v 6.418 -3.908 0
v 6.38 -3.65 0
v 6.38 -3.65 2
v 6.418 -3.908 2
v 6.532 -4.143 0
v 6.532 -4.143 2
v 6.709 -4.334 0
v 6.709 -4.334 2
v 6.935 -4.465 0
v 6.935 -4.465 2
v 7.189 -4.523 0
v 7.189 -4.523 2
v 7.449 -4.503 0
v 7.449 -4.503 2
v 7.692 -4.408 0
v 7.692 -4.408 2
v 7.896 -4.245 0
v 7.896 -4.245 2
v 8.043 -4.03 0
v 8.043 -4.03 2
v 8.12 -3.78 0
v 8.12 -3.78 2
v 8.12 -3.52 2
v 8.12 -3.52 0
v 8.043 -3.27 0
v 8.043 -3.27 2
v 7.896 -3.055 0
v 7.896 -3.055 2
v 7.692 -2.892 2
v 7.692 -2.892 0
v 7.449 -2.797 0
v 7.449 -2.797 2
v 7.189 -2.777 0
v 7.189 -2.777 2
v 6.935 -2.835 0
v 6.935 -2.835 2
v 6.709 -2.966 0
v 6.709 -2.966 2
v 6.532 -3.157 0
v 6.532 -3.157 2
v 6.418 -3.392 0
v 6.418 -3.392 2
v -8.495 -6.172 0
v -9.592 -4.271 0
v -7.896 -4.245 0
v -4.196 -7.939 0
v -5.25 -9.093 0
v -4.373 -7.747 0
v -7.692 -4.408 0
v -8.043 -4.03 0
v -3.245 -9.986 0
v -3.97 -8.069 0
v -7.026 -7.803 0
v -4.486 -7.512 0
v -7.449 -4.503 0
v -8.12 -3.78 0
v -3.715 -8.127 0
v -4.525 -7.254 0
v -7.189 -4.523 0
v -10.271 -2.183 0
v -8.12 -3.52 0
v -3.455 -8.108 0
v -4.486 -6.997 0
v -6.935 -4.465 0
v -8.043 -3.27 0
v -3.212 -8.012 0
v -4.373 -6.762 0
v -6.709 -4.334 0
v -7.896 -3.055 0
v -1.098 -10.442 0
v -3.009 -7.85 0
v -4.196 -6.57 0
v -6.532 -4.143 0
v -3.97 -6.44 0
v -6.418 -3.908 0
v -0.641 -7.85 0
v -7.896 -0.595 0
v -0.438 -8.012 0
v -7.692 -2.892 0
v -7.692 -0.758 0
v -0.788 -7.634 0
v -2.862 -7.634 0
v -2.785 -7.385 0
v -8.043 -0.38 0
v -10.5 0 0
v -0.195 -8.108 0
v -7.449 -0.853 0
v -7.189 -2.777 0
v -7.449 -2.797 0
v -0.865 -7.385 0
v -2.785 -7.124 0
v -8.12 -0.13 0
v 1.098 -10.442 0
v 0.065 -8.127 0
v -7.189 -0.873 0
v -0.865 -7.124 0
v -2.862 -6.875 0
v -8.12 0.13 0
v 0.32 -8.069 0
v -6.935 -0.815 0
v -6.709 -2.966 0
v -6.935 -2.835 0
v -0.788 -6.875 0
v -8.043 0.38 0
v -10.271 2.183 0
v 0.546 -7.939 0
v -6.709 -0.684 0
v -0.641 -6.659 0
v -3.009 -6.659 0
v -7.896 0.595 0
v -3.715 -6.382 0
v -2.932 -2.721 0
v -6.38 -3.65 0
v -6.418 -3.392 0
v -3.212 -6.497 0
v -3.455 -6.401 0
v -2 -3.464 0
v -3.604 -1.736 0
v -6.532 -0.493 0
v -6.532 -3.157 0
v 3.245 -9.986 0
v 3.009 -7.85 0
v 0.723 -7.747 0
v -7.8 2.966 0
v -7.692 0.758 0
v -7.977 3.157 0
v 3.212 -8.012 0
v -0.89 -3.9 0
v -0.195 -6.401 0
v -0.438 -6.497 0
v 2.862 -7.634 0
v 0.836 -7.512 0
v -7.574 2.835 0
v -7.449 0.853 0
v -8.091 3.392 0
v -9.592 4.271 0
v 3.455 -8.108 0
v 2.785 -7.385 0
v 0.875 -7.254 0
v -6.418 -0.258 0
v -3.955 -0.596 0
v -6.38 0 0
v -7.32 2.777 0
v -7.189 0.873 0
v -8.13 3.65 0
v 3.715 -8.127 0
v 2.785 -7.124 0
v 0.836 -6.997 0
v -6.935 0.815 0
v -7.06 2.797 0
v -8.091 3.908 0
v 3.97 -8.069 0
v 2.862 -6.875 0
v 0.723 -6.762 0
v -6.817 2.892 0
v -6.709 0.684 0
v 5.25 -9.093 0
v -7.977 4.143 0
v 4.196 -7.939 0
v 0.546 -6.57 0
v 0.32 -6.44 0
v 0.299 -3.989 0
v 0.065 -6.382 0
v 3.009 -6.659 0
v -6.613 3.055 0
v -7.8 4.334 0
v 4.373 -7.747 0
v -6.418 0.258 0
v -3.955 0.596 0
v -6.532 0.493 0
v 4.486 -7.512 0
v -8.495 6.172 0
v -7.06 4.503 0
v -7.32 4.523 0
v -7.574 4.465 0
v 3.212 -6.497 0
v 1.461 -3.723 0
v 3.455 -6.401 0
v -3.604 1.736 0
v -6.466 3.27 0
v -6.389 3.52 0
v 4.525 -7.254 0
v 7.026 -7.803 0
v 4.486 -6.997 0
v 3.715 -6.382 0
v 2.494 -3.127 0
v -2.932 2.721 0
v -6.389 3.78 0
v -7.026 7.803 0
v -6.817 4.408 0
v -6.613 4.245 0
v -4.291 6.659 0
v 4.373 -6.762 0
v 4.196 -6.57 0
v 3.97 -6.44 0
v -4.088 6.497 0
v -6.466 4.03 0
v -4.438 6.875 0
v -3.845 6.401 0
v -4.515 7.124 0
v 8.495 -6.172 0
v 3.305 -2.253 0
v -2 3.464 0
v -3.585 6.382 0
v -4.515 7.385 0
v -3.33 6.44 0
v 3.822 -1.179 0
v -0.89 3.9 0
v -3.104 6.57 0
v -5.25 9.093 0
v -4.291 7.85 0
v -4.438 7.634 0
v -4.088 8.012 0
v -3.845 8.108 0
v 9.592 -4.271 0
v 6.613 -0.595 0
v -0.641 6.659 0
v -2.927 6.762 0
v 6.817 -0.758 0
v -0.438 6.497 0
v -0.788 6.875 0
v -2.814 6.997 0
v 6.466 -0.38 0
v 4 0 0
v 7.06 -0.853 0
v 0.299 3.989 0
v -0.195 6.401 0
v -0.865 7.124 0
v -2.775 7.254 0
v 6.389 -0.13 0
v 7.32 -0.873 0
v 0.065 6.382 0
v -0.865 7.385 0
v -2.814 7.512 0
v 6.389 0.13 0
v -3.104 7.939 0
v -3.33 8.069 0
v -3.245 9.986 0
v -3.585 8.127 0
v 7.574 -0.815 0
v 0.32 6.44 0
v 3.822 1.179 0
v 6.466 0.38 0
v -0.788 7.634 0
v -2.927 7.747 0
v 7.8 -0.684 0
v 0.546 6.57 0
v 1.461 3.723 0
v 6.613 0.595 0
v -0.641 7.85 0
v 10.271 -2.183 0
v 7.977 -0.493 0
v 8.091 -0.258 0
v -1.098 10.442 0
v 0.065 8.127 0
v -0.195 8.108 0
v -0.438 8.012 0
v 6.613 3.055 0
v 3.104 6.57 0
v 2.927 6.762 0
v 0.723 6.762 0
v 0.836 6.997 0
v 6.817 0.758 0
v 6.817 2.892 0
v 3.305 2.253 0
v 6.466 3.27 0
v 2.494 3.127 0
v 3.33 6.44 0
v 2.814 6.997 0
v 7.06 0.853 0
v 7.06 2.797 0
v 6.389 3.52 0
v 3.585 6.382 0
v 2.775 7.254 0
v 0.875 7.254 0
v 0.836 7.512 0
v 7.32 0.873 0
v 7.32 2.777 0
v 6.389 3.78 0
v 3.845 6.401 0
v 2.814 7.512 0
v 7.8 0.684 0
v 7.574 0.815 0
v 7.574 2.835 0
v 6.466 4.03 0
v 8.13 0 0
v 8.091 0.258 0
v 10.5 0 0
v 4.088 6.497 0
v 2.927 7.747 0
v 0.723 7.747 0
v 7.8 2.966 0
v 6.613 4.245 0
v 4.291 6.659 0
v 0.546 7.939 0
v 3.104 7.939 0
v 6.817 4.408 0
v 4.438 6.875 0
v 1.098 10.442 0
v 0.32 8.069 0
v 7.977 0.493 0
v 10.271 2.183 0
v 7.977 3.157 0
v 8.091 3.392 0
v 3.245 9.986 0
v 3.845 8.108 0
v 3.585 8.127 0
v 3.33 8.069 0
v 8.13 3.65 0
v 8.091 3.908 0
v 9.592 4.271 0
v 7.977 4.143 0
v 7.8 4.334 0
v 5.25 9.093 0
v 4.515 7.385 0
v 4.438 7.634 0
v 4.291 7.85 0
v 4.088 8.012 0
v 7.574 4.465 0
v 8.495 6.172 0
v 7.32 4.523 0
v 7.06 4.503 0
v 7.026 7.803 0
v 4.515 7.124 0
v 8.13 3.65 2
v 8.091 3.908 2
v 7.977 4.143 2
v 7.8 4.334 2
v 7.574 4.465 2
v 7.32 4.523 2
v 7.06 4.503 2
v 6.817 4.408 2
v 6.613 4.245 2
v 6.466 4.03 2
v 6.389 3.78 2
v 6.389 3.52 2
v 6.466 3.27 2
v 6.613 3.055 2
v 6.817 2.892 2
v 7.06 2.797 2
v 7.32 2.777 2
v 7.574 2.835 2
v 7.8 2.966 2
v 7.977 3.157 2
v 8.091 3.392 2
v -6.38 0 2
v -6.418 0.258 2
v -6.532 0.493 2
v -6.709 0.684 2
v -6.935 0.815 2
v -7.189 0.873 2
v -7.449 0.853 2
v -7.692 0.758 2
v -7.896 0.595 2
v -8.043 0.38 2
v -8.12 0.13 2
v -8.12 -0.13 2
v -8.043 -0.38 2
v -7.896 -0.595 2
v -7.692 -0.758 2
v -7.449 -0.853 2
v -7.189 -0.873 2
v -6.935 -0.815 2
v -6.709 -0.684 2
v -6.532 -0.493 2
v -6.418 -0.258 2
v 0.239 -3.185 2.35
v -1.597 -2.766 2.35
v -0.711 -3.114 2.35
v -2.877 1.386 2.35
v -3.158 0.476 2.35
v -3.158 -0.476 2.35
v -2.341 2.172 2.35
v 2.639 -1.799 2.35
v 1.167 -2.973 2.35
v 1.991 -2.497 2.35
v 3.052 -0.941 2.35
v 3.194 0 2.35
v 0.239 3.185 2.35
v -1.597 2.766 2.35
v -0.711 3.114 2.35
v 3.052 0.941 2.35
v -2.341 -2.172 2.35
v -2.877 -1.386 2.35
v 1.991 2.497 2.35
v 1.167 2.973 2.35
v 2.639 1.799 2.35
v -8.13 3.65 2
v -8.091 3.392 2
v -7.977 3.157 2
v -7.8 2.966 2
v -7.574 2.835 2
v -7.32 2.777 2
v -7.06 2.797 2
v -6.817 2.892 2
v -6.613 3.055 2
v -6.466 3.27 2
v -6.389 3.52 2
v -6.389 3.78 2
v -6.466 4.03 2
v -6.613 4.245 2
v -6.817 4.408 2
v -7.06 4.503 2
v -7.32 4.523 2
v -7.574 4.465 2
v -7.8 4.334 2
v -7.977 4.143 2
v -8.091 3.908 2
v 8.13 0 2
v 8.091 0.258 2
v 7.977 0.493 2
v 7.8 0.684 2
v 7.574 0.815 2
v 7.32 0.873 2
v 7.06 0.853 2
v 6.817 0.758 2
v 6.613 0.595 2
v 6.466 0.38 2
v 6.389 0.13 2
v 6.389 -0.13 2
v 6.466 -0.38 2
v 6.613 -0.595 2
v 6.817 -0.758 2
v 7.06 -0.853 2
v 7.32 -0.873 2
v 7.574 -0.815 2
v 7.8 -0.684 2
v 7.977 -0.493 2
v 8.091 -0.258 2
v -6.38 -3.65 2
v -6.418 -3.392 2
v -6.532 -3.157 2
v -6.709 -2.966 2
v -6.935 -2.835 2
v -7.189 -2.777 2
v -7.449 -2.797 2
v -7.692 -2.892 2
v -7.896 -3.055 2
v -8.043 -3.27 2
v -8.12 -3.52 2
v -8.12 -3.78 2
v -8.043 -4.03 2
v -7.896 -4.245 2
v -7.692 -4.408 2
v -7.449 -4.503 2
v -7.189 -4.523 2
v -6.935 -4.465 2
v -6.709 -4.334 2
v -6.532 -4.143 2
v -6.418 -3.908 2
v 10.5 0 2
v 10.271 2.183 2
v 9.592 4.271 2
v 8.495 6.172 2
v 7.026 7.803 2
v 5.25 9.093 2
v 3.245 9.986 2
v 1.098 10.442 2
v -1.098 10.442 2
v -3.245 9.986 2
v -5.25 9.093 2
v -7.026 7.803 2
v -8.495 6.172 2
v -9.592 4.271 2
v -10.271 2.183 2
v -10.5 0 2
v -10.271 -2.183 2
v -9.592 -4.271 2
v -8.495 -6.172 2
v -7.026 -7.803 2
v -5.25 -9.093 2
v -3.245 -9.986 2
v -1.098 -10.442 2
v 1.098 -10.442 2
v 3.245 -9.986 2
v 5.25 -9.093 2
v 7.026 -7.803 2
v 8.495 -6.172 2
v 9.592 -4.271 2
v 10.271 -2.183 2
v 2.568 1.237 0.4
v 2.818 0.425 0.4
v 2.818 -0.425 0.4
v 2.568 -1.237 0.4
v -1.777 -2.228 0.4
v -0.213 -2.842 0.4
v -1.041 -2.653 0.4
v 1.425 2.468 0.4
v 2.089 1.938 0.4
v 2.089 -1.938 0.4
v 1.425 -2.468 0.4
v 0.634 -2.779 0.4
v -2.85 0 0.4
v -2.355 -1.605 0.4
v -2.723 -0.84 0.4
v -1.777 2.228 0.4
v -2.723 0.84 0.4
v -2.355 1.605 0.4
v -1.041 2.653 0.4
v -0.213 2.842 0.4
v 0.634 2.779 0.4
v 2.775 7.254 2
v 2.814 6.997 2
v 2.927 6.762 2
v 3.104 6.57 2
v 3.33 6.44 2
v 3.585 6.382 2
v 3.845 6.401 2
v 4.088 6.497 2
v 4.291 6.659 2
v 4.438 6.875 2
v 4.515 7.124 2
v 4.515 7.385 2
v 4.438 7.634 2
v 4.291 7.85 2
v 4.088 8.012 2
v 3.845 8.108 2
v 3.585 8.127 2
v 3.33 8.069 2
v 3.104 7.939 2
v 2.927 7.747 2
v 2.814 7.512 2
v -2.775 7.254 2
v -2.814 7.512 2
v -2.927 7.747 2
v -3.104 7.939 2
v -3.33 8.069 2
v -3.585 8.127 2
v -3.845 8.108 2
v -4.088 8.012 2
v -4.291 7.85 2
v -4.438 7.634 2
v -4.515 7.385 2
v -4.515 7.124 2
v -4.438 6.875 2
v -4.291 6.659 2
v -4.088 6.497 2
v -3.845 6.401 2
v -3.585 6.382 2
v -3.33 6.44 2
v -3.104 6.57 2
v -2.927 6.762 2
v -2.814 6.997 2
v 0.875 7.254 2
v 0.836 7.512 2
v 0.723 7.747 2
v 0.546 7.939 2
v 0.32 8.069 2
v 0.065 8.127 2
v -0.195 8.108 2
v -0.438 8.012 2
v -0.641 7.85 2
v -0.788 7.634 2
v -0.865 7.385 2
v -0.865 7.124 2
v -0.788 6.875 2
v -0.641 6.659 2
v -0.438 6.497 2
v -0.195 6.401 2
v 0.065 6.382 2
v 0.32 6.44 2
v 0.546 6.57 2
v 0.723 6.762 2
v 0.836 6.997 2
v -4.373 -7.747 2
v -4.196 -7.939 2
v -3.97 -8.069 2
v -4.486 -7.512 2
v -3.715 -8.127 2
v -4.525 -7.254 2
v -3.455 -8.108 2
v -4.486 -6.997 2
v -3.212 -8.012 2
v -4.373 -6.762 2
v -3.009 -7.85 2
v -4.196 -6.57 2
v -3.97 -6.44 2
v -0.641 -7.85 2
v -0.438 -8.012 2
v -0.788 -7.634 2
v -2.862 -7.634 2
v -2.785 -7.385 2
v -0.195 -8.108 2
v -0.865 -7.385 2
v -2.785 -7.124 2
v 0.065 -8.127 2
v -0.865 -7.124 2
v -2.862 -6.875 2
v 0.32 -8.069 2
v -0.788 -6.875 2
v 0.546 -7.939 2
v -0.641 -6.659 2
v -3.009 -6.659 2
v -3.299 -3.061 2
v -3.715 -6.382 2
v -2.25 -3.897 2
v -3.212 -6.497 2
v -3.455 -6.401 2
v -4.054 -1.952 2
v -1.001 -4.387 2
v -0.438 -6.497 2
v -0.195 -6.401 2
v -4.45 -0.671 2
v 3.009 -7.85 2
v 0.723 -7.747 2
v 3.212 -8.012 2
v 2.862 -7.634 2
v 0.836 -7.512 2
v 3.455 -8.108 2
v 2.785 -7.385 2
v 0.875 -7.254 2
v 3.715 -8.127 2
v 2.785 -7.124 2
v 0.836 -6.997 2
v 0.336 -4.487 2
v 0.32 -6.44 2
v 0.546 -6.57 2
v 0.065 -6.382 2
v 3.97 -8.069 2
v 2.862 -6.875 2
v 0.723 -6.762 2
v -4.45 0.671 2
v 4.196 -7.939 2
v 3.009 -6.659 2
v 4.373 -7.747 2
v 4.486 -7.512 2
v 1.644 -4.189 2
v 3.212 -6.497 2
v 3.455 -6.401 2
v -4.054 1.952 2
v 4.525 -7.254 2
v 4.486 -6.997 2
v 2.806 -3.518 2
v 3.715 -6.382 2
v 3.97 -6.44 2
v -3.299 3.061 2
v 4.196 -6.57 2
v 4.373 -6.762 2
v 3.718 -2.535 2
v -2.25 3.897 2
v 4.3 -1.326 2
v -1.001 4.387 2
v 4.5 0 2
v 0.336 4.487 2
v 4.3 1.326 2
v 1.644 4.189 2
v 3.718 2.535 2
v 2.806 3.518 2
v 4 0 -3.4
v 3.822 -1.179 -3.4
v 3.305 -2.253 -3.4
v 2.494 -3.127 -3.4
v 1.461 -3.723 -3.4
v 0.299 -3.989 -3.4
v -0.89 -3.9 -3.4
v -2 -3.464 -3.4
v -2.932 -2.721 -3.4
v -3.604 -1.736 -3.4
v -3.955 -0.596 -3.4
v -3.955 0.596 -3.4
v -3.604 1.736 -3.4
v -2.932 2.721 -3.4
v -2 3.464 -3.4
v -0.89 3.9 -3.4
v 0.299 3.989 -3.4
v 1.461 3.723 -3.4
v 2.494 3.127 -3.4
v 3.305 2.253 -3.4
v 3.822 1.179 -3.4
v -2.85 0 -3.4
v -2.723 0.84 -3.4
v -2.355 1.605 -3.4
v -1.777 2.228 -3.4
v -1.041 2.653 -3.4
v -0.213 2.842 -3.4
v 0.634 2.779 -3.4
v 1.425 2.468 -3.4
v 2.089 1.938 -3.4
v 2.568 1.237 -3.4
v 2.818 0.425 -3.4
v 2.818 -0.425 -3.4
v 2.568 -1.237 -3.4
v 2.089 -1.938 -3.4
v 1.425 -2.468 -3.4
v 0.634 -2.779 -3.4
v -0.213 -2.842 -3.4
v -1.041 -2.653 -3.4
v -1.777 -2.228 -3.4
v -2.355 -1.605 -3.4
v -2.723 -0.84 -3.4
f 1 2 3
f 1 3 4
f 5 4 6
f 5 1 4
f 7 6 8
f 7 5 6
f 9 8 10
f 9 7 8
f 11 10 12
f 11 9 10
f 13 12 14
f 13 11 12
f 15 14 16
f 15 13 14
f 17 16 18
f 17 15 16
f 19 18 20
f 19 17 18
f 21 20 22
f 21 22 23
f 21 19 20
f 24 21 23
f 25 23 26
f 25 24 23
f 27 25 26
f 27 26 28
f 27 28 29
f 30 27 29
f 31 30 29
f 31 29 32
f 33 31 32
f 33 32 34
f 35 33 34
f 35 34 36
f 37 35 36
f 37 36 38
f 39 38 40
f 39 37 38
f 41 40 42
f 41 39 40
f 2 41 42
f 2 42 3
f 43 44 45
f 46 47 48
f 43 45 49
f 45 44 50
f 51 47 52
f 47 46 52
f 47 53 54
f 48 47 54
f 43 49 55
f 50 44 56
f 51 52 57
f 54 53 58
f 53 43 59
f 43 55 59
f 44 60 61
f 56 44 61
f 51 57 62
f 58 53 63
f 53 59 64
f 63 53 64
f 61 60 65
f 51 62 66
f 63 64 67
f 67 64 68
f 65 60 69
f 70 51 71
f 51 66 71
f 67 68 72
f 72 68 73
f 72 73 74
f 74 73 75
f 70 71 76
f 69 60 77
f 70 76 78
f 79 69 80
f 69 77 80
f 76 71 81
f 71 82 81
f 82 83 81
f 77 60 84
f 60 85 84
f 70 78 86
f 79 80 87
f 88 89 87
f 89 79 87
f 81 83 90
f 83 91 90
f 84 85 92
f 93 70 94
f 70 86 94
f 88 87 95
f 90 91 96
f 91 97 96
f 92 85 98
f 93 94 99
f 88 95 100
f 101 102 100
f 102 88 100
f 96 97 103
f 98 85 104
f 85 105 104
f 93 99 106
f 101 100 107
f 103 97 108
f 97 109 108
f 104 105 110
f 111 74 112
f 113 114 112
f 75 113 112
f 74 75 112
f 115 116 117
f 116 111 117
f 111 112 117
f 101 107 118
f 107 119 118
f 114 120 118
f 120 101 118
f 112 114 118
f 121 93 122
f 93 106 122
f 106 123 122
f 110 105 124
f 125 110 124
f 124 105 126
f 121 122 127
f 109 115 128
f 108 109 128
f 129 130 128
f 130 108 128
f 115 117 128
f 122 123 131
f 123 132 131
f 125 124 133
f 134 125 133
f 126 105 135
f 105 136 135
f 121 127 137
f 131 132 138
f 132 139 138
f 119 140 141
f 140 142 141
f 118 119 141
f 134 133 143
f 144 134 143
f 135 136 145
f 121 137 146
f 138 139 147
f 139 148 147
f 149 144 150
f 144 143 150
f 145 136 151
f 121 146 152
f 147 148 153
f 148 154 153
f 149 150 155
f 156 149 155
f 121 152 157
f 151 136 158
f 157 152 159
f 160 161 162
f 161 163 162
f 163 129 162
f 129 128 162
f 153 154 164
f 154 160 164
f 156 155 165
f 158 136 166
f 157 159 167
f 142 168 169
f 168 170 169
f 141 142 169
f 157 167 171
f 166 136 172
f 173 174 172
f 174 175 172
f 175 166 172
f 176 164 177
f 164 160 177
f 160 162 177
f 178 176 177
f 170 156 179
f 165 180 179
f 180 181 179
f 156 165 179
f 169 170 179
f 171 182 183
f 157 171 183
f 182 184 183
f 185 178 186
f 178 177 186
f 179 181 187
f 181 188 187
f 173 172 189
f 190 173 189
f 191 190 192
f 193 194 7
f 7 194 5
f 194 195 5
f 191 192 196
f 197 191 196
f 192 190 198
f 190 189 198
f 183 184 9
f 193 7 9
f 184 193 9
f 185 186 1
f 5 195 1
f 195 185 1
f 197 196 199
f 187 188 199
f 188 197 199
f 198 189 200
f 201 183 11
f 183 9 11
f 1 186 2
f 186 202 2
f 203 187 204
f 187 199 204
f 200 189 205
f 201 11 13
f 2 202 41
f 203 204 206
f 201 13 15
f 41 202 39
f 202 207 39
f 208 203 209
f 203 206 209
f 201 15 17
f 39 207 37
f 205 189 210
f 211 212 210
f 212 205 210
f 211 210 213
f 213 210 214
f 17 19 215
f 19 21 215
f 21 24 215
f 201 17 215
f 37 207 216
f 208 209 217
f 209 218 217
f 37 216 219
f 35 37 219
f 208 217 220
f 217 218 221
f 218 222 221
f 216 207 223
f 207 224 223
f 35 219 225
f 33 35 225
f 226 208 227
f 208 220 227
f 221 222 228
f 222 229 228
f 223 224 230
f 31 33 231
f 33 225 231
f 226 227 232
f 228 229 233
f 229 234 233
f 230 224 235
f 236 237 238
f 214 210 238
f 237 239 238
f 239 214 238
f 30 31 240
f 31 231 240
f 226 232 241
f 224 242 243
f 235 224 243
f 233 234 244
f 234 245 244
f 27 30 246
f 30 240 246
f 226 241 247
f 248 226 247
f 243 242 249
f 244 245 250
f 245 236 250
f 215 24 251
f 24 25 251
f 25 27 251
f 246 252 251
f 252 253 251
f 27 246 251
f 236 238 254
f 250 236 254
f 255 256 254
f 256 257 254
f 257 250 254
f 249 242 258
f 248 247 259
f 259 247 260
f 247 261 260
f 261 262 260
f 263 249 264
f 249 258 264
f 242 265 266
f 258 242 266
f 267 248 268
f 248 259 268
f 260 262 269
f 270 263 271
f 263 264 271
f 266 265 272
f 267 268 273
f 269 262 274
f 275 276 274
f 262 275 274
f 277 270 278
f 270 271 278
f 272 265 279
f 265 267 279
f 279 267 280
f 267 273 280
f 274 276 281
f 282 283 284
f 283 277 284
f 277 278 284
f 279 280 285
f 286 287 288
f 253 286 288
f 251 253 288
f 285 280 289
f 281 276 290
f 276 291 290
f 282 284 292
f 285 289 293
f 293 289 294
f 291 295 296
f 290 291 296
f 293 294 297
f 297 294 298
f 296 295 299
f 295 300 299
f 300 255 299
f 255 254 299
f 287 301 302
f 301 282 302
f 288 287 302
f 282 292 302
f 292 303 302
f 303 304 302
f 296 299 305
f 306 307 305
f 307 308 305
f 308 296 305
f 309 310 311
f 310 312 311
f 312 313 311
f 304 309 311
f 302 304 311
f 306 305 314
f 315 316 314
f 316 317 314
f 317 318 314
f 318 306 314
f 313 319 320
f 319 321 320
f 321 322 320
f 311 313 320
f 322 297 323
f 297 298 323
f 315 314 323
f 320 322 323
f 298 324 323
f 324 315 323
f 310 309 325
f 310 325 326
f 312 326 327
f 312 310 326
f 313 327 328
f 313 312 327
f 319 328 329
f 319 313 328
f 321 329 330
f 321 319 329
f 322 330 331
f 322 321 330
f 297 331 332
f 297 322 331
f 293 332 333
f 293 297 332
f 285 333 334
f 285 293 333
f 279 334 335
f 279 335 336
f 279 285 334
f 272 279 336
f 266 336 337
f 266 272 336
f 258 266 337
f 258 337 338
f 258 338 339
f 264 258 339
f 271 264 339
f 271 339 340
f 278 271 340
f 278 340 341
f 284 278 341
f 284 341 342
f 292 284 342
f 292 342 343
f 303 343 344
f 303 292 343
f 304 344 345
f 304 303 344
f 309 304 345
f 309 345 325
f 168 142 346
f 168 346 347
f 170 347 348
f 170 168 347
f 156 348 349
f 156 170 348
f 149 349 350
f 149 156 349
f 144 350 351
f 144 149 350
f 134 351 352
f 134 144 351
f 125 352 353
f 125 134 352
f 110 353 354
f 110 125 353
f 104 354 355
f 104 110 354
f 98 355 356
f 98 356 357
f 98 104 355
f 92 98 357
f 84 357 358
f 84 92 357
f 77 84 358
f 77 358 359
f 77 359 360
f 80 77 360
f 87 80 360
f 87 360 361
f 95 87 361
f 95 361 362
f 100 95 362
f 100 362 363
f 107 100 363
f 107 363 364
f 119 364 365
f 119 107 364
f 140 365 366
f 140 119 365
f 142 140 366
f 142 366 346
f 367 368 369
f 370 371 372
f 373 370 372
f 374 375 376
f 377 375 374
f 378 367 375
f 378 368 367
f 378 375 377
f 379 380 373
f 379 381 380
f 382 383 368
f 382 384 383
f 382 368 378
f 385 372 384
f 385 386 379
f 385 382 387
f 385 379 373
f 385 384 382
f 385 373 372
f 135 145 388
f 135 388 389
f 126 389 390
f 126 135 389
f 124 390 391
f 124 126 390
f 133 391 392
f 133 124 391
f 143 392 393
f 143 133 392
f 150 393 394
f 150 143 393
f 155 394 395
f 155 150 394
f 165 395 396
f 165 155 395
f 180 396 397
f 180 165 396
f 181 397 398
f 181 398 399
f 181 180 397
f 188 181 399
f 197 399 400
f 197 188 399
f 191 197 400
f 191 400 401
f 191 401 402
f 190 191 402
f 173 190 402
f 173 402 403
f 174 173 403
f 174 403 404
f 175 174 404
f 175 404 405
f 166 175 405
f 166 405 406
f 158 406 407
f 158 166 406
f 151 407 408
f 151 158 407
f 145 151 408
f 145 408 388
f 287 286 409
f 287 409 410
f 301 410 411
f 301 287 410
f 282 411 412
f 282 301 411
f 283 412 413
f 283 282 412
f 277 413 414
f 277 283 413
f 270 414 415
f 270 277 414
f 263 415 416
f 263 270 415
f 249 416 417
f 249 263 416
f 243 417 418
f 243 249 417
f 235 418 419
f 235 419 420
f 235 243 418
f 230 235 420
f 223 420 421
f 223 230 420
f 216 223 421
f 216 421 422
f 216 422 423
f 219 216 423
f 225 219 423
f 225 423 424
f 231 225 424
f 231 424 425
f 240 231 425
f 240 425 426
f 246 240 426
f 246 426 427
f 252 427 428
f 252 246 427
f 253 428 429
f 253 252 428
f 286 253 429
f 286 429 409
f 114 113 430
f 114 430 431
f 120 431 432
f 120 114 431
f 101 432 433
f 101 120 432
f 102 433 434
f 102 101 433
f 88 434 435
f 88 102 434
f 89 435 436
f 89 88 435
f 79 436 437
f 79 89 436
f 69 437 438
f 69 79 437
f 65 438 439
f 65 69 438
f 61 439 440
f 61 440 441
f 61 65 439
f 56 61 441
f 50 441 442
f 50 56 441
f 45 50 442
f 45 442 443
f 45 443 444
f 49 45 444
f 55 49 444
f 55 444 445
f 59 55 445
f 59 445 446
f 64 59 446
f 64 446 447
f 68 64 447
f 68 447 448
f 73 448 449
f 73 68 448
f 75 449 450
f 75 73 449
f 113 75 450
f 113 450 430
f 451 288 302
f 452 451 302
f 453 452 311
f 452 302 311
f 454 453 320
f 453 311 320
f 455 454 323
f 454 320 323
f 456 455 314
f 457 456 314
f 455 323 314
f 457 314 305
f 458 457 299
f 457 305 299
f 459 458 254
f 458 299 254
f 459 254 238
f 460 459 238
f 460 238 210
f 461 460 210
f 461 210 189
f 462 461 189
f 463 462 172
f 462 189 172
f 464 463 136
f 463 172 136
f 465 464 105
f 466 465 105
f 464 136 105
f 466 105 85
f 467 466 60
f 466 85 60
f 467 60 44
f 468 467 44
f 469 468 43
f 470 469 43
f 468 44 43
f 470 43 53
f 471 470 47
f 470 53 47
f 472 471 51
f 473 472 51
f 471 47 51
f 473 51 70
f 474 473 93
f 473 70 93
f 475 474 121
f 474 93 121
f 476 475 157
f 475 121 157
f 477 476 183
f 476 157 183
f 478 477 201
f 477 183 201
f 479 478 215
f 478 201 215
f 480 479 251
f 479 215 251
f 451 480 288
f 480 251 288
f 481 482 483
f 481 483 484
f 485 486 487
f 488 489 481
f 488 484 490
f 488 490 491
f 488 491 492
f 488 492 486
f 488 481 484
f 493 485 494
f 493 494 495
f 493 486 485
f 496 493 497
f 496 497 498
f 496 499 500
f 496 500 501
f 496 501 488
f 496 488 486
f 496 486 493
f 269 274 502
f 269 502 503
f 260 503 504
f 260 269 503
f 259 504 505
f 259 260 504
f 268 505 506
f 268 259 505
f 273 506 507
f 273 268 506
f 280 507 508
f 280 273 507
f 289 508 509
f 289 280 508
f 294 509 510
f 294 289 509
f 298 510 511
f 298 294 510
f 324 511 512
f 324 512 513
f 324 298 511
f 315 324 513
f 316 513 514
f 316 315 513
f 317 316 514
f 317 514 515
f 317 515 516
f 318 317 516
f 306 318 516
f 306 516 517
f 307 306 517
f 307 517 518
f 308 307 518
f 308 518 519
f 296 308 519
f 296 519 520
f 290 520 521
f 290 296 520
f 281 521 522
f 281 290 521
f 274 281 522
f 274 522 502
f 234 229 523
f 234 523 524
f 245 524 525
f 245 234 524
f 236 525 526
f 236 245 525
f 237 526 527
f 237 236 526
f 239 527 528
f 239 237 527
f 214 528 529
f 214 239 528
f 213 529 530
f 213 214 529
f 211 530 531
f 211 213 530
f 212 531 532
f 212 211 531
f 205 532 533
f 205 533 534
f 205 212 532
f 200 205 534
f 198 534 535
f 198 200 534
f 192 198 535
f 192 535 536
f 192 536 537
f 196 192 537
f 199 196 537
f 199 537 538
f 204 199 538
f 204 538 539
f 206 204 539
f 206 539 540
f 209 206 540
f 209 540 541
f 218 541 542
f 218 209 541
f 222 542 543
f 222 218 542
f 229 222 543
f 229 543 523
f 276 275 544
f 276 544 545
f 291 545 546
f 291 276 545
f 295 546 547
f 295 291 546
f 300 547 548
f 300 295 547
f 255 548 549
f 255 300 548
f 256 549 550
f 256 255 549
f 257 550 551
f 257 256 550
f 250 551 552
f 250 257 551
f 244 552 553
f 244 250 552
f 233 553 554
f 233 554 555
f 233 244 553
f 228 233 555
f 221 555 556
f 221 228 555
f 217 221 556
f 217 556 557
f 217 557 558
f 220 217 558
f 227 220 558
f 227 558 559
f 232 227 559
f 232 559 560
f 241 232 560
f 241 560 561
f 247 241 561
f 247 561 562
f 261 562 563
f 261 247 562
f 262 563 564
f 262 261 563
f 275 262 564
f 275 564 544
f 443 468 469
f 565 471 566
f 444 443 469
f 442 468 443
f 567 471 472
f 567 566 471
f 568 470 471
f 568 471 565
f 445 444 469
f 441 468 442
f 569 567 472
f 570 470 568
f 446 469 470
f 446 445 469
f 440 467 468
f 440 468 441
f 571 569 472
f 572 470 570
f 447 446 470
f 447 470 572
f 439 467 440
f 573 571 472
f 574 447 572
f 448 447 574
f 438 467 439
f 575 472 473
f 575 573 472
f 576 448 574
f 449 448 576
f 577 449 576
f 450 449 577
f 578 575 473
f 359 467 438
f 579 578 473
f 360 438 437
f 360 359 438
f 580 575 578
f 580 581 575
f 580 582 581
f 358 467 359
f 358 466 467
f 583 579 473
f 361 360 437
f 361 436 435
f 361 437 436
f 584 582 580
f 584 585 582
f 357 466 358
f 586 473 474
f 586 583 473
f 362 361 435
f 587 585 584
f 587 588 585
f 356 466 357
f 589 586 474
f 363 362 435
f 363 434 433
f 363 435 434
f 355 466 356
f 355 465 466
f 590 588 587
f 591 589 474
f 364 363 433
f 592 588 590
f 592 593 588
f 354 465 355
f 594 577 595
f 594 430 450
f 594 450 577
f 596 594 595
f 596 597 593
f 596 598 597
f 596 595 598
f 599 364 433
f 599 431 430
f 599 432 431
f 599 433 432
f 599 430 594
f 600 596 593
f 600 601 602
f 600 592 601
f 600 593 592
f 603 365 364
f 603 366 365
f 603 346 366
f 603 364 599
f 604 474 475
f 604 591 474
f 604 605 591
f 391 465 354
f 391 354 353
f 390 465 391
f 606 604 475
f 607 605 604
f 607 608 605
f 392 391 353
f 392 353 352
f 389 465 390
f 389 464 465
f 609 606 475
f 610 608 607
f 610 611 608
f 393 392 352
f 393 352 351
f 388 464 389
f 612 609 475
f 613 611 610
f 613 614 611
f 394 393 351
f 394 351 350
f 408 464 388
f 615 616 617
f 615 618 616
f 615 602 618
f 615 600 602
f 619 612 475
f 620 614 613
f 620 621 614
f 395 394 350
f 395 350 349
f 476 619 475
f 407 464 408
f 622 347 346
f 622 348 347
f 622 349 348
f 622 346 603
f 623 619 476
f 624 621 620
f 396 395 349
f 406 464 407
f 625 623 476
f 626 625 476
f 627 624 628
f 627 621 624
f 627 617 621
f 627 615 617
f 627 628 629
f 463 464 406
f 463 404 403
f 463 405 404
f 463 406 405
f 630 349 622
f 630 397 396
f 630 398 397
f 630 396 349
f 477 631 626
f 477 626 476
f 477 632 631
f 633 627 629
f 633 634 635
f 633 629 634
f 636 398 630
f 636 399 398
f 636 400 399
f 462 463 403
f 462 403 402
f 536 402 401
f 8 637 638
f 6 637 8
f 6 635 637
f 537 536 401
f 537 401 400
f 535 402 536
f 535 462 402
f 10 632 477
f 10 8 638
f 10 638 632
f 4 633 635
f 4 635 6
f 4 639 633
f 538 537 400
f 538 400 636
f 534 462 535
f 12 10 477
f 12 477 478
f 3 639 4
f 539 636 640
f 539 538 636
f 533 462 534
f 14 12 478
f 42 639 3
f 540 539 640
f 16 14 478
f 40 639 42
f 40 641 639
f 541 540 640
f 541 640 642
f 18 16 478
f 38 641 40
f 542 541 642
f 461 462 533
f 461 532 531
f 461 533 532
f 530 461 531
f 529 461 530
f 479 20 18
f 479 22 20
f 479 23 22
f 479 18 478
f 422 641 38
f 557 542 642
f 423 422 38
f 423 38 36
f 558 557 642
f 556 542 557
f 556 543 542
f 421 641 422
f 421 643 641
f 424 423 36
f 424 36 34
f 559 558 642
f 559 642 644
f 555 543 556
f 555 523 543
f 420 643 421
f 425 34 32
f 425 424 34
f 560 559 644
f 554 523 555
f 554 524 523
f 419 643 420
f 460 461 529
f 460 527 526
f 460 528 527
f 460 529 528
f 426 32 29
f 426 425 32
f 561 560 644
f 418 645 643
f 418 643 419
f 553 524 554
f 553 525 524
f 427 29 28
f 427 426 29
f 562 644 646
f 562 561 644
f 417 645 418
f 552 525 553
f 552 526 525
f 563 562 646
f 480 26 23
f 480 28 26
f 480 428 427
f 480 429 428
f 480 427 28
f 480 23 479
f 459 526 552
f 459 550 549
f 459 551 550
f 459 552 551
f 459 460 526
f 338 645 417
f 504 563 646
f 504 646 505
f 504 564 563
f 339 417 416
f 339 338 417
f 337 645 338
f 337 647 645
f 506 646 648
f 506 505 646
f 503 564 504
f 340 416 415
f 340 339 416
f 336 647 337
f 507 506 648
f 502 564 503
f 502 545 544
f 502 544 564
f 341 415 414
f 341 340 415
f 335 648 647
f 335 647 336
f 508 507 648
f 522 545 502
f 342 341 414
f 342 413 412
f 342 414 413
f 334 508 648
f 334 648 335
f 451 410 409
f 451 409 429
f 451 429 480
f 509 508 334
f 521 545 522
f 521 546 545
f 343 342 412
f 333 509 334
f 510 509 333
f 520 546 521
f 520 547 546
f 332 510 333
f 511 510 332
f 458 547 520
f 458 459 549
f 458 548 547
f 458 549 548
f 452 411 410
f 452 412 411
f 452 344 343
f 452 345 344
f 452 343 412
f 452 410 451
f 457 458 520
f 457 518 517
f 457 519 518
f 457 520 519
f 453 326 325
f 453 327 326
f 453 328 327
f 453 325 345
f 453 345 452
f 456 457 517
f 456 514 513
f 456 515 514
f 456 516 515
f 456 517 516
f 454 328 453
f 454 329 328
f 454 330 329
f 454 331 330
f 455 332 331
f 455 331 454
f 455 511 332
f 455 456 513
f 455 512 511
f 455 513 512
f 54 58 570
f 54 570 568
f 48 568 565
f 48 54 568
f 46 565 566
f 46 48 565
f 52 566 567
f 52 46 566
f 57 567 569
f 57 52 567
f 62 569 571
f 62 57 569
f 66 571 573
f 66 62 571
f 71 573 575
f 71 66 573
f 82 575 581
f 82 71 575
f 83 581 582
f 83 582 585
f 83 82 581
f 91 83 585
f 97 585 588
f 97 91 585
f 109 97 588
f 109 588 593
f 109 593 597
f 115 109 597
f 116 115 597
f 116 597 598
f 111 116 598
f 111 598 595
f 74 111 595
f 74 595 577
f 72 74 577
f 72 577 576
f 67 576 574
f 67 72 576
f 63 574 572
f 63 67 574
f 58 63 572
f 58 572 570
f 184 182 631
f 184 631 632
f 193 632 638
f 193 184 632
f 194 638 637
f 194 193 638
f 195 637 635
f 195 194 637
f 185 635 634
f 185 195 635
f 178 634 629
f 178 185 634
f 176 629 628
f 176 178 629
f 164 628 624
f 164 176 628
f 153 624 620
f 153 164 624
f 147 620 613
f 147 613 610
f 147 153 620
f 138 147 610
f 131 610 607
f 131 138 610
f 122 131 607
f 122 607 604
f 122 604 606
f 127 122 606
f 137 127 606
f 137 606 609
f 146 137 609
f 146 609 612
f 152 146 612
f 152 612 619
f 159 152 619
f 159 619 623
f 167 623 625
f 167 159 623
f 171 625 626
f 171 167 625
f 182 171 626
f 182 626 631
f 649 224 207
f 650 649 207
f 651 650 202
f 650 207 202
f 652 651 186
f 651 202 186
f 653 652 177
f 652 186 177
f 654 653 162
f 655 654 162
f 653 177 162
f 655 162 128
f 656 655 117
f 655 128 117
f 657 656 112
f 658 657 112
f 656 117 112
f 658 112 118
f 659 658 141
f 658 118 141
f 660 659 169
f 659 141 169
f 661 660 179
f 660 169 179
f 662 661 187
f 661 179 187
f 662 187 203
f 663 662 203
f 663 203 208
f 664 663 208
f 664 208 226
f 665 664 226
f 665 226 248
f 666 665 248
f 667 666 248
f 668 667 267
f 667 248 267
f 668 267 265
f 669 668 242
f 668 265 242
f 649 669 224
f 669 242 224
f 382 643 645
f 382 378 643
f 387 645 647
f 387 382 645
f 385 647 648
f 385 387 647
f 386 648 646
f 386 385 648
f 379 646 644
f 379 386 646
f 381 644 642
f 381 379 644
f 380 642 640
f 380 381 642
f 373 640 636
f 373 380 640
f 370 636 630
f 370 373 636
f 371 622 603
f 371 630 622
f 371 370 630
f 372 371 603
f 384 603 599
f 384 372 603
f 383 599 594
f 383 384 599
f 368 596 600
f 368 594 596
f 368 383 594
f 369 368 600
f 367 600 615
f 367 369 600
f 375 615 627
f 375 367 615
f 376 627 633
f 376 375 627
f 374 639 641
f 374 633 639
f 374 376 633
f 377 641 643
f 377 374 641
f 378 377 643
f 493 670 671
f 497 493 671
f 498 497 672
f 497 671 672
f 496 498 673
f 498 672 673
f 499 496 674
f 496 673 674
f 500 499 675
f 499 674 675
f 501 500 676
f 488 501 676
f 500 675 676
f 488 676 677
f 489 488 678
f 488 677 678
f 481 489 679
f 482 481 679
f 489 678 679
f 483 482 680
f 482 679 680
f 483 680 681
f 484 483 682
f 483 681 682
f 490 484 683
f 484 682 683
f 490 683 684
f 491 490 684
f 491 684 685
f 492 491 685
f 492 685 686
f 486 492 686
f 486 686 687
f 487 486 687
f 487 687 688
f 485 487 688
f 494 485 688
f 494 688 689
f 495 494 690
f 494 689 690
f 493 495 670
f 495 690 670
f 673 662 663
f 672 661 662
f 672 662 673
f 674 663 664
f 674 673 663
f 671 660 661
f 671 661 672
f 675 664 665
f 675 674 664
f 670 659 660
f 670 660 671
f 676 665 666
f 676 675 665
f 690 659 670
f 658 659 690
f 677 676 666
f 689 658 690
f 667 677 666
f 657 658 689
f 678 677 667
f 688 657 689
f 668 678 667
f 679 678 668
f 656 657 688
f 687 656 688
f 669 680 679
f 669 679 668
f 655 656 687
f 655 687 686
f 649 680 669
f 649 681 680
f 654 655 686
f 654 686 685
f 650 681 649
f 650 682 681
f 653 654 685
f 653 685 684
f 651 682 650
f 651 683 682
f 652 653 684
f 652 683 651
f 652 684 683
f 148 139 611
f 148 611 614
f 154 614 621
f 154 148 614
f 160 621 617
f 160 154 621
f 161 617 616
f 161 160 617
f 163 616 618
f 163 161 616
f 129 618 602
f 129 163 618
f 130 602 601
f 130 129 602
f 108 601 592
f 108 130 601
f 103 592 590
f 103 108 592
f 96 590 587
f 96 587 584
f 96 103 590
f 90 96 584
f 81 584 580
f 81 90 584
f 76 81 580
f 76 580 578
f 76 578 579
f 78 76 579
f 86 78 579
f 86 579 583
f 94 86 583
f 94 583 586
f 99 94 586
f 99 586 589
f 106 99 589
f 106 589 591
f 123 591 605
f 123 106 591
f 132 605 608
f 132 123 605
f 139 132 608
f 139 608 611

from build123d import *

# Parameters (mm, degrees)
ESQUISSE1_R             = 10.5
ESQUISSE1_R_2           = 0.875
BOSS_EXTRU_1_DEPTH      = 2
ESQUISSE2_R             = 4.5
BOSS_EXTRU_2_DEPTH      = 0.35
BOSS_EXTRU_2_TAPER      = 75
ESQUISSE3_R             = 4
BOSS_EXTRU_3_DEPTH      = 3.4
ESQUISSE4_R             = 2.85
ENL_V_MAT_EXTRU_1_DEPTH = 3.8


with BuildPart() as part:
    # Esquisse1 → Boss.-Extru.1 (new body)
    with BuildSketch(Plane.XY):
        Circle(ESQUISSE1_R)
        with Locations((7.2545, 3.65)):
            Circle(ESQUISSE1_R_2, mode=Mode.SUBTRACT)
        with Locations((7.2545, 0)):
            Circle(ESQUISSE1_R_2, mode=Mode.SUBTRACT)
        with Locations(Location((7.2545, -3.65, 0), (0, 0, 180))):
            Circle(ESQUISSE1_R_2, mode=Mode.SUBTRACT)
        with Locations((3.65, -7.2545)):
            Circle(ESQUISSE1_R_2, mode=Mode.SUBTRACT)
        with Locations((0, -7.2545)):
            Circle(ESQUISSE1_R_2, mode=Mode.SUBTRACT)
        with Locations(Location((-3.65, -7.2545, 0), (0, 0, 180))):
            Circle(ESQUISSE1_R_2, mode=Mode.SUBTRACT)
        with Locations((-7.2545, -3.65)):
            Circle(ESQUISSE1_R_2, mode=Mode.SUBTRACT)
        with Locations((-7.2545, 0)):
            Circle(ESQUISSE1_R_2, mode=Mode.SUBTRACT)
        with Locations(Location((-7.2545, 3.65, 0), (0, 0, 180))):
            Circle(ESQUISSE1_R_2, mode=Mode.SUBTRACT)
        with Locations((-3.65, 7.2545)):
            Circle(ESQUISSE1_R_2, mode=Mode.SUBTRACT)
        with Locations((0, 7.2545)):
            Circle(ESQUISSE1_R_2, mode=Mode.SUBTRACT)
        with Locations(Location((3.65, 7.2545, 0), (0, 0, 180))):
            Circle(ESQUISSE1_R_2, mode=Mode.SUBTRACT)
    extrude(amount=BOSS_EXTRU_1_DEPTH)

    # Esquisse2 → Boss.-Extru.2 (add)
    with BuildSketch(Plane.XY.offset(2)):
        Circle(ESQUISSE2_R)
    extrude(amount=BOSS_EXTRU_2_DEPTH, taper=BOSS_EXTRU_2_TAPER)

    # Esquisse3 → Boss.-Extru.3 (add)
    with BuildSketch(Plane(origin=(0, 0, 0), x_dir=(-1, 0, 0), z_dir=(0, 0, -1))):
        with Locations(Location((0, 0, 0), (0, 0, 180))):
            Circle(ESQUISSE3_R)
    extrude(amount=BOSS_EXTRU_3_DEPTH)

    # Esquisse4 → Enlèv. mat.-Extru.1 (cut)
    with BuildSketch(Plane(origin=(0, 0, -3.4), x_dir=(-1, 0, 0), z_dir=(0, 0, -1))):
        Circle(ESQUISSE4_R)
    extrude(amount=-ENL_V_MAT_EXTRU_1_DEPTH, mode=Mode.SUBTRACT)


solid = part.part
